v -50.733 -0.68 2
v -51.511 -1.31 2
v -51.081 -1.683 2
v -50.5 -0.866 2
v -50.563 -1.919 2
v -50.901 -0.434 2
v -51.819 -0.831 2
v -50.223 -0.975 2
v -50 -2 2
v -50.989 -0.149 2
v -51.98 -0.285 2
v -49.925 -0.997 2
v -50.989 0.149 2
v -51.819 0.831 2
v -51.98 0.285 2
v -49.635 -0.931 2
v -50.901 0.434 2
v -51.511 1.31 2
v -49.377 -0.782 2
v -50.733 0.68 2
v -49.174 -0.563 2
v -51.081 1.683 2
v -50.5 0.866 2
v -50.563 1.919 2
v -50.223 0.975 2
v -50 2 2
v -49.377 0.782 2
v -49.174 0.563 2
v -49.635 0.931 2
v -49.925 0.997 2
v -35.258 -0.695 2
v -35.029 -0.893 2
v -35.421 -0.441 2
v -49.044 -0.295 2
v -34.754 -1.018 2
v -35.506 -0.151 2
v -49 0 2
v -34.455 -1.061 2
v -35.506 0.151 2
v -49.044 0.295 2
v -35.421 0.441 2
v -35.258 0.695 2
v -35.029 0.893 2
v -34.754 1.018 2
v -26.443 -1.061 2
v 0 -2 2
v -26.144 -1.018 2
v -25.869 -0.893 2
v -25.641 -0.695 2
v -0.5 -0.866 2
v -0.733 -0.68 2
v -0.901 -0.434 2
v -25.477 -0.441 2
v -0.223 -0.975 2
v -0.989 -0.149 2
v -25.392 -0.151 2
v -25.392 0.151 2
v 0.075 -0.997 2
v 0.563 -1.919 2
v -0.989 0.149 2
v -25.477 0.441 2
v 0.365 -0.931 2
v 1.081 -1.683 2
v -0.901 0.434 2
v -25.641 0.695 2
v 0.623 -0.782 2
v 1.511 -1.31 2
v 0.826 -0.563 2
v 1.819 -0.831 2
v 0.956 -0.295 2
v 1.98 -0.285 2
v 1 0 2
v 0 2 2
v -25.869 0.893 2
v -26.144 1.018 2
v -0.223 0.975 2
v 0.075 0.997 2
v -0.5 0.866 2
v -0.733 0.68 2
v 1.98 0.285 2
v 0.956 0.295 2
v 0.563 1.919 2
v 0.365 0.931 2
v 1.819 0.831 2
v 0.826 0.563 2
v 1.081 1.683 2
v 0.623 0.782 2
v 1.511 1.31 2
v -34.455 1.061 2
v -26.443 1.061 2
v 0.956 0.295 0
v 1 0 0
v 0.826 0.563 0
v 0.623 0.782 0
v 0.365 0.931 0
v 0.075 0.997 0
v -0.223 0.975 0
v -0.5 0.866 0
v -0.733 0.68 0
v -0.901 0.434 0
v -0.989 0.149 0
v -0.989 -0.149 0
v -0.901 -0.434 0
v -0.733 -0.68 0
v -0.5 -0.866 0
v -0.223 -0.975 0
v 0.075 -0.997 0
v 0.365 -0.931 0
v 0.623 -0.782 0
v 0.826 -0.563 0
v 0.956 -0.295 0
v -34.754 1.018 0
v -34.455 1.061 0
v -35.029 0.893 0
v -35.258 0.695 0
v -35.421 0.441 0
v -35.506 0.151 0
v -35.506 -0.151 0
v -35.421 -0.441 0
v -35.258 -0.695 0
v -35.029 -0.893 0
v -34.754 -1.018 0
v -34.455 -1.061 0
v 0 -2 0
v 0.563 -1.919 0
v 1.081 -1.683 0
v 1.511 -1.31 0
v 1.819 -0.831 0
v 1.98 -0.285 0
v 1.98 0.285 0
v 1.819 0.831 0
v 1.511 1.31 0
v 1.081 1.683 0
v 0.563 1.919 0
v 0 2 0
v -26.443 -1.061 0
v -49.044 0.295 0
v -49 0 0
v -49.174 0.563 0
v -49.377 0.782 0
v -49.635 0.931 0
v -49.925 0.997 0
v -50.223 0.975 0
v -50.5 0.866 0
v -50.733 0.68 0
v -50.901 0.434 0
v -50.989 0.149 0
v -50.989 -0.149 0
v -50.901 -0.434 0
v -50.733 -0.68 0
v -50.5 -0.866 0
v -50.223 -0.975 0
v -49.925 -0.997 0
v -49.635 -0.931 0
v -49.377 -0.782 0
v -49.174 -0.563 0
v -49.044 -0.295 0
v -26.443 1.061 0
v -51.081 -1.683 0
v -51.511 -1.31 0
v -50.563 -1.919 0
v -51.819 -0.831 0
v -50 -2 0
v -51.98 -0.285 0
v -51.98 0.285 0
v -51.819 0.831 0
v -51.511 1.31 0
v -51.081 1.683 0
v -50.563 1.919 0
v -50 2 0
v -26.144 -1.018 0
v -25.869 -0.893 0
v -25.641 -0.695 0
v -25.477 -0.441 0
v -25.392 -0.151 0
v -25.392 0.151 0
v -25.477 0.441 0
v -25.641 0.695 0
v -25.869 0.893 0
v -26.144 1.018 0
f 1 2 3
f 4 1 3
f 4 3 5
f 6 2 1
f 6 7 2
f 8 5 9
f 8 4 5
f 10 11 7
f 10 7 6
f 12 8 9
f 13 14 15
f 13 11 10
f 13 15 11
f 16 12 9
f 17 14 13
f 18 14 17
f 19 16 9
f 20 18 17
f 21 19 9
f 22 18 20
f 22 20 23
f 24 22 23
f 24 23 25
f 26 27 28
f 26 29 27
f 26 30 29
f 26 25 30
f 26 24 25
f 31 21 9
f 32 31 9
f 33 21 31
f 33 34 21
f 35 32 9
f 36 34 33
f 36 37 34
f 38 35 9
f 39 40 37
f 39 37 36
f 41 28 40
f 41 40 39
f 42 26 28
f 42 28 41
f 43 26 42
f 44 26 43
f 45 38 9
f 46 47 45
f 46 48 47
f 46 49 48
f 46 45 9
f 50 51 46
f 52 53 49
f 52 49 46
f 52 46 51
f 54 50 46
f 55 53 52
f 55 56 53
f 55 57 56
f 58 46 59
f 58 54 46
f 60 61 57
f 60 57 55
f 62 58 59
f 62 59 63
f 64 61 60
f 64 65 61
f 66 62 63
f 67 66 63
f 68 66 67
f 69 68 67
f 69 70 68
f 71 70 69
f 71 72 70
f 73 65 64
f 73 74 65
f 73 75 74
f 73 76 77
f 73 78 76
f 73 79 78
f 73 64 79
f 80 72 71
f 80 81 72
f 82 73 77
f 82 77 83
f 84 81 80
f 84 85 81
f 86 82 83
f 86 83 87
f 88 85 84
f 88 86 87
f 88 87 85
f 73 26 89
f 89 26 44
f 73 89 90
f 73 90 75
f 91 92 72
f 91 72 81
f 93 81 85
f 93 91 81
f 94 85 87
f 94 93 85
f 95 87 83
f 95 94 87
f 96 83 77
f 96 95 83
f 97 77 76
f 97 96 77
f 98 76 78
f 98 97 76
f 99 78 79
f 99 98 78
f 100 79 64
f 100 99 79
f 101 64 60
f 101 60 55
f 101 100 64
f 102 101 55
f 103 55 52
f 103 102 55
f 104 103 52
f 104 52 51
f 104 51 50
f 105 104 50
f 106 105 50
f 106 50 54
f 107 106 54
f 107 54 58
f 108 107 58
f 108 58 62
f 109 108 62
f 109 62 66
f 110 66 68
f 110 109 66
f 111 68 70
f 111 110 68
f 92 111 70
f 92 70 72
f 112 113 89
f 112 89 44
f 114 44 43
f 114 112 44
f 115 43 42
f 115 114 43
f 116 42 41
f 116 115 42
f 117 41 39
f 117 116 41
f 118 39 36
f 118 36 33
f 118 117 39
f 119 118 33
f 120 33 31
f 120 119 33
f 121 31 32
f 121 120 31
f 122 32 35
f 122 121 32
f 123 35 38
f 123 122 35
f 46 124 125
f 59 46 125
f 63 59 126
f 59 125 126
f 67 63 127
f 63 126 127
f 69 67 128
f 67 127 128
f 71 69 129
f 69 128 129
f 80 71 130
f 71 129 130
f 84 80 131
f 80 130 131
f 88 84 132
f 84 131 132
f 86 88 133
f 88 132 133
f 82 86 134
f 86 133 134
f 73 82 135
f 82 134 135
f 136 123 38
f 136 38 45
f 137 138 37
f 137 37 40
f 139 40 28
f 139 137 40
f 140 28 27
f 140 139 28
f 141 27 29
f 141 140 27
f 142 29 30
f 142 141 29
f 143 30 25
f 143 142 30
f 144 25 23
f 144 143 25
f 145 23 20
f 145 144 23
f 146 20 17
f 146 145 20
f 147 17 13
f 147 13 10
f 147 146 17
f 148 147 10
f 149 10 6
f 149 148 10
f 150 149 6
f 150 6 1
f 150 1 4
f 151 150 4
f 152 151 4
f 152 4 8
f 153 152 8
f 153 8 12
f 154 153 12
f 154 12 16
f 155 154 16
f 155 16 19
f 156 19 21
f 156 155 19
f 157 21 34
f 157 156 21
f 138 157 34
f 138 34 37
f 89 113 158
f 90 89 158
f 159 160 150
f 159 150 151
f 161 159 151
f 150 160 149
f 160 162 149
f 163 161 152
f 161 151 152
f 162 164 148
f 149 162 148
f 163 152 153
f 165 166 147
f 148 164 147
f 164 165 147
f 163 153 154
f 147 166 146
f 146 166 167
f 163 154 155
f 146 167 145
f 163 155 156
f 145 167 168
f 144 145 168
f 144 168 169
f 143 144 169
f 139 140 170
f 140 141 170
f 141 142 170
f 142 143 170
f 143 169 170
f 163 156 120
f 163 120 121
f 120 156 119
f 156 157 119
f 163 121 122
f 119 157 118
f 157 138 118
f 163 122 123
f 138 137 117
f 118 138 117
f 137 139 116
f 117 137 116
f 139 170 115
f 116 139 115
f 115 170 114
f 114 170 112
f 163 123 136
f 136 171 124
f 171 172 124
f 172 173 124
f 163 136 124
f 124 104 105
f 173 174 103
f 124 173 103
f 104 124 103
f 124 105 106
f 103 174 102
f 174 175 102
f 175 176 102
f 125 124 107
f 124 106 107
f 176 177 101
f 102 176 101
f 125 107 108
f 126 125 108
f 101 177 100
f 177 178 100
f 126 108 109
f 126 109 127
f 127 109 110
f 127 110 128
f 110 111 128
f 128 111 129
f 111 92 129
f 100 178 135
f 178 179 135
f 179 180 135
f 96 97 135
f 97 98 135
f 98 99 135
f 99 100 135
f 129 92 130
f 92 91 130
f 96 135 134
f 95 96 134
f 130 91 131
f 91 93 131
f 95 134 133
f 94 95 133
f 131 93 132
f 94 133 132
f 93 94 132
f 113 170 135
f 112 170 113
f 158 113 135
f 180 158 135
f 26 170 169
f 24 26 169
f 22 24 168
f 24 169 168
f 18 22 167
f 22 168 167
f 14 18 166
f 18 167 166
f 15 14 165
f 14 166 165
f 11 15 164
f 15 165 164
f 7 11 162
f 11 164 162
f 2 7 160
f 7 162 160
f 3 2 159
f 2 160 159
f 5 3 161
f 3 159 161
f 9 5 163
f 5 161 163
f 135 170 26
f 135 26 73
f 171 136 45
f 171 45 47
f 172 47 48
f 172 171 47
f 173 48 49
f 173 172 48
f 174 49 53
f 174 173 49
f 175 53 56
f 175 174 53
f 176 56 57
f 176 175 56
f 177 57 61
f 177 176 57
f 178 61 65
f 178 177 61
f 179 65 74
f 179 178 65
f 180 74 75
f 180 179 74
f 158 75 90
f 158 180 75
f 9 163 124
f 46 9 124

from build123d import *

# Parameters (mm, degrees)
SKETCH_R  = 1
PAD_DEPTH = 2


with BuildPart() as part:
    # Sketch → Pad (new body)
    with BuildSketch(Plane.XY):
        with BuildLine():
            ThreePointArc((-50, 2), (-52, 0), (-50, -2))
            Line((-50, -2), (0, -2))
            ThreePointArc((0, -2), (2, 0), (0, 2))
            Line((-50, 2), (0, 2))
        make_face()
        Circle(SKETCH_R, mode=Mode.SUBTRACT)
        with Locations((-50, 0)):
            Circle(SKETCH_R, mode=Mode.SUBTRACT)
        with BuildLine():
            ThreePointArc((-34.455448, 1.061365), (-35.516813, 0), (-34.455448, -1.061365))
            Line((-34.455448, -1.061365), (-26.442669, -1.061365))
            ThreePointArc((-26.442669, -1.061365), (-25.381304, 0), (-26.442669, 1.061365))
            Line((-34.455448, 1.061365), (-26.442669, 1.061365))
        make_face(mode=Mode.SUBTRACT)
    extrude(amount=PAD_DEPTH)


solid = part.part
